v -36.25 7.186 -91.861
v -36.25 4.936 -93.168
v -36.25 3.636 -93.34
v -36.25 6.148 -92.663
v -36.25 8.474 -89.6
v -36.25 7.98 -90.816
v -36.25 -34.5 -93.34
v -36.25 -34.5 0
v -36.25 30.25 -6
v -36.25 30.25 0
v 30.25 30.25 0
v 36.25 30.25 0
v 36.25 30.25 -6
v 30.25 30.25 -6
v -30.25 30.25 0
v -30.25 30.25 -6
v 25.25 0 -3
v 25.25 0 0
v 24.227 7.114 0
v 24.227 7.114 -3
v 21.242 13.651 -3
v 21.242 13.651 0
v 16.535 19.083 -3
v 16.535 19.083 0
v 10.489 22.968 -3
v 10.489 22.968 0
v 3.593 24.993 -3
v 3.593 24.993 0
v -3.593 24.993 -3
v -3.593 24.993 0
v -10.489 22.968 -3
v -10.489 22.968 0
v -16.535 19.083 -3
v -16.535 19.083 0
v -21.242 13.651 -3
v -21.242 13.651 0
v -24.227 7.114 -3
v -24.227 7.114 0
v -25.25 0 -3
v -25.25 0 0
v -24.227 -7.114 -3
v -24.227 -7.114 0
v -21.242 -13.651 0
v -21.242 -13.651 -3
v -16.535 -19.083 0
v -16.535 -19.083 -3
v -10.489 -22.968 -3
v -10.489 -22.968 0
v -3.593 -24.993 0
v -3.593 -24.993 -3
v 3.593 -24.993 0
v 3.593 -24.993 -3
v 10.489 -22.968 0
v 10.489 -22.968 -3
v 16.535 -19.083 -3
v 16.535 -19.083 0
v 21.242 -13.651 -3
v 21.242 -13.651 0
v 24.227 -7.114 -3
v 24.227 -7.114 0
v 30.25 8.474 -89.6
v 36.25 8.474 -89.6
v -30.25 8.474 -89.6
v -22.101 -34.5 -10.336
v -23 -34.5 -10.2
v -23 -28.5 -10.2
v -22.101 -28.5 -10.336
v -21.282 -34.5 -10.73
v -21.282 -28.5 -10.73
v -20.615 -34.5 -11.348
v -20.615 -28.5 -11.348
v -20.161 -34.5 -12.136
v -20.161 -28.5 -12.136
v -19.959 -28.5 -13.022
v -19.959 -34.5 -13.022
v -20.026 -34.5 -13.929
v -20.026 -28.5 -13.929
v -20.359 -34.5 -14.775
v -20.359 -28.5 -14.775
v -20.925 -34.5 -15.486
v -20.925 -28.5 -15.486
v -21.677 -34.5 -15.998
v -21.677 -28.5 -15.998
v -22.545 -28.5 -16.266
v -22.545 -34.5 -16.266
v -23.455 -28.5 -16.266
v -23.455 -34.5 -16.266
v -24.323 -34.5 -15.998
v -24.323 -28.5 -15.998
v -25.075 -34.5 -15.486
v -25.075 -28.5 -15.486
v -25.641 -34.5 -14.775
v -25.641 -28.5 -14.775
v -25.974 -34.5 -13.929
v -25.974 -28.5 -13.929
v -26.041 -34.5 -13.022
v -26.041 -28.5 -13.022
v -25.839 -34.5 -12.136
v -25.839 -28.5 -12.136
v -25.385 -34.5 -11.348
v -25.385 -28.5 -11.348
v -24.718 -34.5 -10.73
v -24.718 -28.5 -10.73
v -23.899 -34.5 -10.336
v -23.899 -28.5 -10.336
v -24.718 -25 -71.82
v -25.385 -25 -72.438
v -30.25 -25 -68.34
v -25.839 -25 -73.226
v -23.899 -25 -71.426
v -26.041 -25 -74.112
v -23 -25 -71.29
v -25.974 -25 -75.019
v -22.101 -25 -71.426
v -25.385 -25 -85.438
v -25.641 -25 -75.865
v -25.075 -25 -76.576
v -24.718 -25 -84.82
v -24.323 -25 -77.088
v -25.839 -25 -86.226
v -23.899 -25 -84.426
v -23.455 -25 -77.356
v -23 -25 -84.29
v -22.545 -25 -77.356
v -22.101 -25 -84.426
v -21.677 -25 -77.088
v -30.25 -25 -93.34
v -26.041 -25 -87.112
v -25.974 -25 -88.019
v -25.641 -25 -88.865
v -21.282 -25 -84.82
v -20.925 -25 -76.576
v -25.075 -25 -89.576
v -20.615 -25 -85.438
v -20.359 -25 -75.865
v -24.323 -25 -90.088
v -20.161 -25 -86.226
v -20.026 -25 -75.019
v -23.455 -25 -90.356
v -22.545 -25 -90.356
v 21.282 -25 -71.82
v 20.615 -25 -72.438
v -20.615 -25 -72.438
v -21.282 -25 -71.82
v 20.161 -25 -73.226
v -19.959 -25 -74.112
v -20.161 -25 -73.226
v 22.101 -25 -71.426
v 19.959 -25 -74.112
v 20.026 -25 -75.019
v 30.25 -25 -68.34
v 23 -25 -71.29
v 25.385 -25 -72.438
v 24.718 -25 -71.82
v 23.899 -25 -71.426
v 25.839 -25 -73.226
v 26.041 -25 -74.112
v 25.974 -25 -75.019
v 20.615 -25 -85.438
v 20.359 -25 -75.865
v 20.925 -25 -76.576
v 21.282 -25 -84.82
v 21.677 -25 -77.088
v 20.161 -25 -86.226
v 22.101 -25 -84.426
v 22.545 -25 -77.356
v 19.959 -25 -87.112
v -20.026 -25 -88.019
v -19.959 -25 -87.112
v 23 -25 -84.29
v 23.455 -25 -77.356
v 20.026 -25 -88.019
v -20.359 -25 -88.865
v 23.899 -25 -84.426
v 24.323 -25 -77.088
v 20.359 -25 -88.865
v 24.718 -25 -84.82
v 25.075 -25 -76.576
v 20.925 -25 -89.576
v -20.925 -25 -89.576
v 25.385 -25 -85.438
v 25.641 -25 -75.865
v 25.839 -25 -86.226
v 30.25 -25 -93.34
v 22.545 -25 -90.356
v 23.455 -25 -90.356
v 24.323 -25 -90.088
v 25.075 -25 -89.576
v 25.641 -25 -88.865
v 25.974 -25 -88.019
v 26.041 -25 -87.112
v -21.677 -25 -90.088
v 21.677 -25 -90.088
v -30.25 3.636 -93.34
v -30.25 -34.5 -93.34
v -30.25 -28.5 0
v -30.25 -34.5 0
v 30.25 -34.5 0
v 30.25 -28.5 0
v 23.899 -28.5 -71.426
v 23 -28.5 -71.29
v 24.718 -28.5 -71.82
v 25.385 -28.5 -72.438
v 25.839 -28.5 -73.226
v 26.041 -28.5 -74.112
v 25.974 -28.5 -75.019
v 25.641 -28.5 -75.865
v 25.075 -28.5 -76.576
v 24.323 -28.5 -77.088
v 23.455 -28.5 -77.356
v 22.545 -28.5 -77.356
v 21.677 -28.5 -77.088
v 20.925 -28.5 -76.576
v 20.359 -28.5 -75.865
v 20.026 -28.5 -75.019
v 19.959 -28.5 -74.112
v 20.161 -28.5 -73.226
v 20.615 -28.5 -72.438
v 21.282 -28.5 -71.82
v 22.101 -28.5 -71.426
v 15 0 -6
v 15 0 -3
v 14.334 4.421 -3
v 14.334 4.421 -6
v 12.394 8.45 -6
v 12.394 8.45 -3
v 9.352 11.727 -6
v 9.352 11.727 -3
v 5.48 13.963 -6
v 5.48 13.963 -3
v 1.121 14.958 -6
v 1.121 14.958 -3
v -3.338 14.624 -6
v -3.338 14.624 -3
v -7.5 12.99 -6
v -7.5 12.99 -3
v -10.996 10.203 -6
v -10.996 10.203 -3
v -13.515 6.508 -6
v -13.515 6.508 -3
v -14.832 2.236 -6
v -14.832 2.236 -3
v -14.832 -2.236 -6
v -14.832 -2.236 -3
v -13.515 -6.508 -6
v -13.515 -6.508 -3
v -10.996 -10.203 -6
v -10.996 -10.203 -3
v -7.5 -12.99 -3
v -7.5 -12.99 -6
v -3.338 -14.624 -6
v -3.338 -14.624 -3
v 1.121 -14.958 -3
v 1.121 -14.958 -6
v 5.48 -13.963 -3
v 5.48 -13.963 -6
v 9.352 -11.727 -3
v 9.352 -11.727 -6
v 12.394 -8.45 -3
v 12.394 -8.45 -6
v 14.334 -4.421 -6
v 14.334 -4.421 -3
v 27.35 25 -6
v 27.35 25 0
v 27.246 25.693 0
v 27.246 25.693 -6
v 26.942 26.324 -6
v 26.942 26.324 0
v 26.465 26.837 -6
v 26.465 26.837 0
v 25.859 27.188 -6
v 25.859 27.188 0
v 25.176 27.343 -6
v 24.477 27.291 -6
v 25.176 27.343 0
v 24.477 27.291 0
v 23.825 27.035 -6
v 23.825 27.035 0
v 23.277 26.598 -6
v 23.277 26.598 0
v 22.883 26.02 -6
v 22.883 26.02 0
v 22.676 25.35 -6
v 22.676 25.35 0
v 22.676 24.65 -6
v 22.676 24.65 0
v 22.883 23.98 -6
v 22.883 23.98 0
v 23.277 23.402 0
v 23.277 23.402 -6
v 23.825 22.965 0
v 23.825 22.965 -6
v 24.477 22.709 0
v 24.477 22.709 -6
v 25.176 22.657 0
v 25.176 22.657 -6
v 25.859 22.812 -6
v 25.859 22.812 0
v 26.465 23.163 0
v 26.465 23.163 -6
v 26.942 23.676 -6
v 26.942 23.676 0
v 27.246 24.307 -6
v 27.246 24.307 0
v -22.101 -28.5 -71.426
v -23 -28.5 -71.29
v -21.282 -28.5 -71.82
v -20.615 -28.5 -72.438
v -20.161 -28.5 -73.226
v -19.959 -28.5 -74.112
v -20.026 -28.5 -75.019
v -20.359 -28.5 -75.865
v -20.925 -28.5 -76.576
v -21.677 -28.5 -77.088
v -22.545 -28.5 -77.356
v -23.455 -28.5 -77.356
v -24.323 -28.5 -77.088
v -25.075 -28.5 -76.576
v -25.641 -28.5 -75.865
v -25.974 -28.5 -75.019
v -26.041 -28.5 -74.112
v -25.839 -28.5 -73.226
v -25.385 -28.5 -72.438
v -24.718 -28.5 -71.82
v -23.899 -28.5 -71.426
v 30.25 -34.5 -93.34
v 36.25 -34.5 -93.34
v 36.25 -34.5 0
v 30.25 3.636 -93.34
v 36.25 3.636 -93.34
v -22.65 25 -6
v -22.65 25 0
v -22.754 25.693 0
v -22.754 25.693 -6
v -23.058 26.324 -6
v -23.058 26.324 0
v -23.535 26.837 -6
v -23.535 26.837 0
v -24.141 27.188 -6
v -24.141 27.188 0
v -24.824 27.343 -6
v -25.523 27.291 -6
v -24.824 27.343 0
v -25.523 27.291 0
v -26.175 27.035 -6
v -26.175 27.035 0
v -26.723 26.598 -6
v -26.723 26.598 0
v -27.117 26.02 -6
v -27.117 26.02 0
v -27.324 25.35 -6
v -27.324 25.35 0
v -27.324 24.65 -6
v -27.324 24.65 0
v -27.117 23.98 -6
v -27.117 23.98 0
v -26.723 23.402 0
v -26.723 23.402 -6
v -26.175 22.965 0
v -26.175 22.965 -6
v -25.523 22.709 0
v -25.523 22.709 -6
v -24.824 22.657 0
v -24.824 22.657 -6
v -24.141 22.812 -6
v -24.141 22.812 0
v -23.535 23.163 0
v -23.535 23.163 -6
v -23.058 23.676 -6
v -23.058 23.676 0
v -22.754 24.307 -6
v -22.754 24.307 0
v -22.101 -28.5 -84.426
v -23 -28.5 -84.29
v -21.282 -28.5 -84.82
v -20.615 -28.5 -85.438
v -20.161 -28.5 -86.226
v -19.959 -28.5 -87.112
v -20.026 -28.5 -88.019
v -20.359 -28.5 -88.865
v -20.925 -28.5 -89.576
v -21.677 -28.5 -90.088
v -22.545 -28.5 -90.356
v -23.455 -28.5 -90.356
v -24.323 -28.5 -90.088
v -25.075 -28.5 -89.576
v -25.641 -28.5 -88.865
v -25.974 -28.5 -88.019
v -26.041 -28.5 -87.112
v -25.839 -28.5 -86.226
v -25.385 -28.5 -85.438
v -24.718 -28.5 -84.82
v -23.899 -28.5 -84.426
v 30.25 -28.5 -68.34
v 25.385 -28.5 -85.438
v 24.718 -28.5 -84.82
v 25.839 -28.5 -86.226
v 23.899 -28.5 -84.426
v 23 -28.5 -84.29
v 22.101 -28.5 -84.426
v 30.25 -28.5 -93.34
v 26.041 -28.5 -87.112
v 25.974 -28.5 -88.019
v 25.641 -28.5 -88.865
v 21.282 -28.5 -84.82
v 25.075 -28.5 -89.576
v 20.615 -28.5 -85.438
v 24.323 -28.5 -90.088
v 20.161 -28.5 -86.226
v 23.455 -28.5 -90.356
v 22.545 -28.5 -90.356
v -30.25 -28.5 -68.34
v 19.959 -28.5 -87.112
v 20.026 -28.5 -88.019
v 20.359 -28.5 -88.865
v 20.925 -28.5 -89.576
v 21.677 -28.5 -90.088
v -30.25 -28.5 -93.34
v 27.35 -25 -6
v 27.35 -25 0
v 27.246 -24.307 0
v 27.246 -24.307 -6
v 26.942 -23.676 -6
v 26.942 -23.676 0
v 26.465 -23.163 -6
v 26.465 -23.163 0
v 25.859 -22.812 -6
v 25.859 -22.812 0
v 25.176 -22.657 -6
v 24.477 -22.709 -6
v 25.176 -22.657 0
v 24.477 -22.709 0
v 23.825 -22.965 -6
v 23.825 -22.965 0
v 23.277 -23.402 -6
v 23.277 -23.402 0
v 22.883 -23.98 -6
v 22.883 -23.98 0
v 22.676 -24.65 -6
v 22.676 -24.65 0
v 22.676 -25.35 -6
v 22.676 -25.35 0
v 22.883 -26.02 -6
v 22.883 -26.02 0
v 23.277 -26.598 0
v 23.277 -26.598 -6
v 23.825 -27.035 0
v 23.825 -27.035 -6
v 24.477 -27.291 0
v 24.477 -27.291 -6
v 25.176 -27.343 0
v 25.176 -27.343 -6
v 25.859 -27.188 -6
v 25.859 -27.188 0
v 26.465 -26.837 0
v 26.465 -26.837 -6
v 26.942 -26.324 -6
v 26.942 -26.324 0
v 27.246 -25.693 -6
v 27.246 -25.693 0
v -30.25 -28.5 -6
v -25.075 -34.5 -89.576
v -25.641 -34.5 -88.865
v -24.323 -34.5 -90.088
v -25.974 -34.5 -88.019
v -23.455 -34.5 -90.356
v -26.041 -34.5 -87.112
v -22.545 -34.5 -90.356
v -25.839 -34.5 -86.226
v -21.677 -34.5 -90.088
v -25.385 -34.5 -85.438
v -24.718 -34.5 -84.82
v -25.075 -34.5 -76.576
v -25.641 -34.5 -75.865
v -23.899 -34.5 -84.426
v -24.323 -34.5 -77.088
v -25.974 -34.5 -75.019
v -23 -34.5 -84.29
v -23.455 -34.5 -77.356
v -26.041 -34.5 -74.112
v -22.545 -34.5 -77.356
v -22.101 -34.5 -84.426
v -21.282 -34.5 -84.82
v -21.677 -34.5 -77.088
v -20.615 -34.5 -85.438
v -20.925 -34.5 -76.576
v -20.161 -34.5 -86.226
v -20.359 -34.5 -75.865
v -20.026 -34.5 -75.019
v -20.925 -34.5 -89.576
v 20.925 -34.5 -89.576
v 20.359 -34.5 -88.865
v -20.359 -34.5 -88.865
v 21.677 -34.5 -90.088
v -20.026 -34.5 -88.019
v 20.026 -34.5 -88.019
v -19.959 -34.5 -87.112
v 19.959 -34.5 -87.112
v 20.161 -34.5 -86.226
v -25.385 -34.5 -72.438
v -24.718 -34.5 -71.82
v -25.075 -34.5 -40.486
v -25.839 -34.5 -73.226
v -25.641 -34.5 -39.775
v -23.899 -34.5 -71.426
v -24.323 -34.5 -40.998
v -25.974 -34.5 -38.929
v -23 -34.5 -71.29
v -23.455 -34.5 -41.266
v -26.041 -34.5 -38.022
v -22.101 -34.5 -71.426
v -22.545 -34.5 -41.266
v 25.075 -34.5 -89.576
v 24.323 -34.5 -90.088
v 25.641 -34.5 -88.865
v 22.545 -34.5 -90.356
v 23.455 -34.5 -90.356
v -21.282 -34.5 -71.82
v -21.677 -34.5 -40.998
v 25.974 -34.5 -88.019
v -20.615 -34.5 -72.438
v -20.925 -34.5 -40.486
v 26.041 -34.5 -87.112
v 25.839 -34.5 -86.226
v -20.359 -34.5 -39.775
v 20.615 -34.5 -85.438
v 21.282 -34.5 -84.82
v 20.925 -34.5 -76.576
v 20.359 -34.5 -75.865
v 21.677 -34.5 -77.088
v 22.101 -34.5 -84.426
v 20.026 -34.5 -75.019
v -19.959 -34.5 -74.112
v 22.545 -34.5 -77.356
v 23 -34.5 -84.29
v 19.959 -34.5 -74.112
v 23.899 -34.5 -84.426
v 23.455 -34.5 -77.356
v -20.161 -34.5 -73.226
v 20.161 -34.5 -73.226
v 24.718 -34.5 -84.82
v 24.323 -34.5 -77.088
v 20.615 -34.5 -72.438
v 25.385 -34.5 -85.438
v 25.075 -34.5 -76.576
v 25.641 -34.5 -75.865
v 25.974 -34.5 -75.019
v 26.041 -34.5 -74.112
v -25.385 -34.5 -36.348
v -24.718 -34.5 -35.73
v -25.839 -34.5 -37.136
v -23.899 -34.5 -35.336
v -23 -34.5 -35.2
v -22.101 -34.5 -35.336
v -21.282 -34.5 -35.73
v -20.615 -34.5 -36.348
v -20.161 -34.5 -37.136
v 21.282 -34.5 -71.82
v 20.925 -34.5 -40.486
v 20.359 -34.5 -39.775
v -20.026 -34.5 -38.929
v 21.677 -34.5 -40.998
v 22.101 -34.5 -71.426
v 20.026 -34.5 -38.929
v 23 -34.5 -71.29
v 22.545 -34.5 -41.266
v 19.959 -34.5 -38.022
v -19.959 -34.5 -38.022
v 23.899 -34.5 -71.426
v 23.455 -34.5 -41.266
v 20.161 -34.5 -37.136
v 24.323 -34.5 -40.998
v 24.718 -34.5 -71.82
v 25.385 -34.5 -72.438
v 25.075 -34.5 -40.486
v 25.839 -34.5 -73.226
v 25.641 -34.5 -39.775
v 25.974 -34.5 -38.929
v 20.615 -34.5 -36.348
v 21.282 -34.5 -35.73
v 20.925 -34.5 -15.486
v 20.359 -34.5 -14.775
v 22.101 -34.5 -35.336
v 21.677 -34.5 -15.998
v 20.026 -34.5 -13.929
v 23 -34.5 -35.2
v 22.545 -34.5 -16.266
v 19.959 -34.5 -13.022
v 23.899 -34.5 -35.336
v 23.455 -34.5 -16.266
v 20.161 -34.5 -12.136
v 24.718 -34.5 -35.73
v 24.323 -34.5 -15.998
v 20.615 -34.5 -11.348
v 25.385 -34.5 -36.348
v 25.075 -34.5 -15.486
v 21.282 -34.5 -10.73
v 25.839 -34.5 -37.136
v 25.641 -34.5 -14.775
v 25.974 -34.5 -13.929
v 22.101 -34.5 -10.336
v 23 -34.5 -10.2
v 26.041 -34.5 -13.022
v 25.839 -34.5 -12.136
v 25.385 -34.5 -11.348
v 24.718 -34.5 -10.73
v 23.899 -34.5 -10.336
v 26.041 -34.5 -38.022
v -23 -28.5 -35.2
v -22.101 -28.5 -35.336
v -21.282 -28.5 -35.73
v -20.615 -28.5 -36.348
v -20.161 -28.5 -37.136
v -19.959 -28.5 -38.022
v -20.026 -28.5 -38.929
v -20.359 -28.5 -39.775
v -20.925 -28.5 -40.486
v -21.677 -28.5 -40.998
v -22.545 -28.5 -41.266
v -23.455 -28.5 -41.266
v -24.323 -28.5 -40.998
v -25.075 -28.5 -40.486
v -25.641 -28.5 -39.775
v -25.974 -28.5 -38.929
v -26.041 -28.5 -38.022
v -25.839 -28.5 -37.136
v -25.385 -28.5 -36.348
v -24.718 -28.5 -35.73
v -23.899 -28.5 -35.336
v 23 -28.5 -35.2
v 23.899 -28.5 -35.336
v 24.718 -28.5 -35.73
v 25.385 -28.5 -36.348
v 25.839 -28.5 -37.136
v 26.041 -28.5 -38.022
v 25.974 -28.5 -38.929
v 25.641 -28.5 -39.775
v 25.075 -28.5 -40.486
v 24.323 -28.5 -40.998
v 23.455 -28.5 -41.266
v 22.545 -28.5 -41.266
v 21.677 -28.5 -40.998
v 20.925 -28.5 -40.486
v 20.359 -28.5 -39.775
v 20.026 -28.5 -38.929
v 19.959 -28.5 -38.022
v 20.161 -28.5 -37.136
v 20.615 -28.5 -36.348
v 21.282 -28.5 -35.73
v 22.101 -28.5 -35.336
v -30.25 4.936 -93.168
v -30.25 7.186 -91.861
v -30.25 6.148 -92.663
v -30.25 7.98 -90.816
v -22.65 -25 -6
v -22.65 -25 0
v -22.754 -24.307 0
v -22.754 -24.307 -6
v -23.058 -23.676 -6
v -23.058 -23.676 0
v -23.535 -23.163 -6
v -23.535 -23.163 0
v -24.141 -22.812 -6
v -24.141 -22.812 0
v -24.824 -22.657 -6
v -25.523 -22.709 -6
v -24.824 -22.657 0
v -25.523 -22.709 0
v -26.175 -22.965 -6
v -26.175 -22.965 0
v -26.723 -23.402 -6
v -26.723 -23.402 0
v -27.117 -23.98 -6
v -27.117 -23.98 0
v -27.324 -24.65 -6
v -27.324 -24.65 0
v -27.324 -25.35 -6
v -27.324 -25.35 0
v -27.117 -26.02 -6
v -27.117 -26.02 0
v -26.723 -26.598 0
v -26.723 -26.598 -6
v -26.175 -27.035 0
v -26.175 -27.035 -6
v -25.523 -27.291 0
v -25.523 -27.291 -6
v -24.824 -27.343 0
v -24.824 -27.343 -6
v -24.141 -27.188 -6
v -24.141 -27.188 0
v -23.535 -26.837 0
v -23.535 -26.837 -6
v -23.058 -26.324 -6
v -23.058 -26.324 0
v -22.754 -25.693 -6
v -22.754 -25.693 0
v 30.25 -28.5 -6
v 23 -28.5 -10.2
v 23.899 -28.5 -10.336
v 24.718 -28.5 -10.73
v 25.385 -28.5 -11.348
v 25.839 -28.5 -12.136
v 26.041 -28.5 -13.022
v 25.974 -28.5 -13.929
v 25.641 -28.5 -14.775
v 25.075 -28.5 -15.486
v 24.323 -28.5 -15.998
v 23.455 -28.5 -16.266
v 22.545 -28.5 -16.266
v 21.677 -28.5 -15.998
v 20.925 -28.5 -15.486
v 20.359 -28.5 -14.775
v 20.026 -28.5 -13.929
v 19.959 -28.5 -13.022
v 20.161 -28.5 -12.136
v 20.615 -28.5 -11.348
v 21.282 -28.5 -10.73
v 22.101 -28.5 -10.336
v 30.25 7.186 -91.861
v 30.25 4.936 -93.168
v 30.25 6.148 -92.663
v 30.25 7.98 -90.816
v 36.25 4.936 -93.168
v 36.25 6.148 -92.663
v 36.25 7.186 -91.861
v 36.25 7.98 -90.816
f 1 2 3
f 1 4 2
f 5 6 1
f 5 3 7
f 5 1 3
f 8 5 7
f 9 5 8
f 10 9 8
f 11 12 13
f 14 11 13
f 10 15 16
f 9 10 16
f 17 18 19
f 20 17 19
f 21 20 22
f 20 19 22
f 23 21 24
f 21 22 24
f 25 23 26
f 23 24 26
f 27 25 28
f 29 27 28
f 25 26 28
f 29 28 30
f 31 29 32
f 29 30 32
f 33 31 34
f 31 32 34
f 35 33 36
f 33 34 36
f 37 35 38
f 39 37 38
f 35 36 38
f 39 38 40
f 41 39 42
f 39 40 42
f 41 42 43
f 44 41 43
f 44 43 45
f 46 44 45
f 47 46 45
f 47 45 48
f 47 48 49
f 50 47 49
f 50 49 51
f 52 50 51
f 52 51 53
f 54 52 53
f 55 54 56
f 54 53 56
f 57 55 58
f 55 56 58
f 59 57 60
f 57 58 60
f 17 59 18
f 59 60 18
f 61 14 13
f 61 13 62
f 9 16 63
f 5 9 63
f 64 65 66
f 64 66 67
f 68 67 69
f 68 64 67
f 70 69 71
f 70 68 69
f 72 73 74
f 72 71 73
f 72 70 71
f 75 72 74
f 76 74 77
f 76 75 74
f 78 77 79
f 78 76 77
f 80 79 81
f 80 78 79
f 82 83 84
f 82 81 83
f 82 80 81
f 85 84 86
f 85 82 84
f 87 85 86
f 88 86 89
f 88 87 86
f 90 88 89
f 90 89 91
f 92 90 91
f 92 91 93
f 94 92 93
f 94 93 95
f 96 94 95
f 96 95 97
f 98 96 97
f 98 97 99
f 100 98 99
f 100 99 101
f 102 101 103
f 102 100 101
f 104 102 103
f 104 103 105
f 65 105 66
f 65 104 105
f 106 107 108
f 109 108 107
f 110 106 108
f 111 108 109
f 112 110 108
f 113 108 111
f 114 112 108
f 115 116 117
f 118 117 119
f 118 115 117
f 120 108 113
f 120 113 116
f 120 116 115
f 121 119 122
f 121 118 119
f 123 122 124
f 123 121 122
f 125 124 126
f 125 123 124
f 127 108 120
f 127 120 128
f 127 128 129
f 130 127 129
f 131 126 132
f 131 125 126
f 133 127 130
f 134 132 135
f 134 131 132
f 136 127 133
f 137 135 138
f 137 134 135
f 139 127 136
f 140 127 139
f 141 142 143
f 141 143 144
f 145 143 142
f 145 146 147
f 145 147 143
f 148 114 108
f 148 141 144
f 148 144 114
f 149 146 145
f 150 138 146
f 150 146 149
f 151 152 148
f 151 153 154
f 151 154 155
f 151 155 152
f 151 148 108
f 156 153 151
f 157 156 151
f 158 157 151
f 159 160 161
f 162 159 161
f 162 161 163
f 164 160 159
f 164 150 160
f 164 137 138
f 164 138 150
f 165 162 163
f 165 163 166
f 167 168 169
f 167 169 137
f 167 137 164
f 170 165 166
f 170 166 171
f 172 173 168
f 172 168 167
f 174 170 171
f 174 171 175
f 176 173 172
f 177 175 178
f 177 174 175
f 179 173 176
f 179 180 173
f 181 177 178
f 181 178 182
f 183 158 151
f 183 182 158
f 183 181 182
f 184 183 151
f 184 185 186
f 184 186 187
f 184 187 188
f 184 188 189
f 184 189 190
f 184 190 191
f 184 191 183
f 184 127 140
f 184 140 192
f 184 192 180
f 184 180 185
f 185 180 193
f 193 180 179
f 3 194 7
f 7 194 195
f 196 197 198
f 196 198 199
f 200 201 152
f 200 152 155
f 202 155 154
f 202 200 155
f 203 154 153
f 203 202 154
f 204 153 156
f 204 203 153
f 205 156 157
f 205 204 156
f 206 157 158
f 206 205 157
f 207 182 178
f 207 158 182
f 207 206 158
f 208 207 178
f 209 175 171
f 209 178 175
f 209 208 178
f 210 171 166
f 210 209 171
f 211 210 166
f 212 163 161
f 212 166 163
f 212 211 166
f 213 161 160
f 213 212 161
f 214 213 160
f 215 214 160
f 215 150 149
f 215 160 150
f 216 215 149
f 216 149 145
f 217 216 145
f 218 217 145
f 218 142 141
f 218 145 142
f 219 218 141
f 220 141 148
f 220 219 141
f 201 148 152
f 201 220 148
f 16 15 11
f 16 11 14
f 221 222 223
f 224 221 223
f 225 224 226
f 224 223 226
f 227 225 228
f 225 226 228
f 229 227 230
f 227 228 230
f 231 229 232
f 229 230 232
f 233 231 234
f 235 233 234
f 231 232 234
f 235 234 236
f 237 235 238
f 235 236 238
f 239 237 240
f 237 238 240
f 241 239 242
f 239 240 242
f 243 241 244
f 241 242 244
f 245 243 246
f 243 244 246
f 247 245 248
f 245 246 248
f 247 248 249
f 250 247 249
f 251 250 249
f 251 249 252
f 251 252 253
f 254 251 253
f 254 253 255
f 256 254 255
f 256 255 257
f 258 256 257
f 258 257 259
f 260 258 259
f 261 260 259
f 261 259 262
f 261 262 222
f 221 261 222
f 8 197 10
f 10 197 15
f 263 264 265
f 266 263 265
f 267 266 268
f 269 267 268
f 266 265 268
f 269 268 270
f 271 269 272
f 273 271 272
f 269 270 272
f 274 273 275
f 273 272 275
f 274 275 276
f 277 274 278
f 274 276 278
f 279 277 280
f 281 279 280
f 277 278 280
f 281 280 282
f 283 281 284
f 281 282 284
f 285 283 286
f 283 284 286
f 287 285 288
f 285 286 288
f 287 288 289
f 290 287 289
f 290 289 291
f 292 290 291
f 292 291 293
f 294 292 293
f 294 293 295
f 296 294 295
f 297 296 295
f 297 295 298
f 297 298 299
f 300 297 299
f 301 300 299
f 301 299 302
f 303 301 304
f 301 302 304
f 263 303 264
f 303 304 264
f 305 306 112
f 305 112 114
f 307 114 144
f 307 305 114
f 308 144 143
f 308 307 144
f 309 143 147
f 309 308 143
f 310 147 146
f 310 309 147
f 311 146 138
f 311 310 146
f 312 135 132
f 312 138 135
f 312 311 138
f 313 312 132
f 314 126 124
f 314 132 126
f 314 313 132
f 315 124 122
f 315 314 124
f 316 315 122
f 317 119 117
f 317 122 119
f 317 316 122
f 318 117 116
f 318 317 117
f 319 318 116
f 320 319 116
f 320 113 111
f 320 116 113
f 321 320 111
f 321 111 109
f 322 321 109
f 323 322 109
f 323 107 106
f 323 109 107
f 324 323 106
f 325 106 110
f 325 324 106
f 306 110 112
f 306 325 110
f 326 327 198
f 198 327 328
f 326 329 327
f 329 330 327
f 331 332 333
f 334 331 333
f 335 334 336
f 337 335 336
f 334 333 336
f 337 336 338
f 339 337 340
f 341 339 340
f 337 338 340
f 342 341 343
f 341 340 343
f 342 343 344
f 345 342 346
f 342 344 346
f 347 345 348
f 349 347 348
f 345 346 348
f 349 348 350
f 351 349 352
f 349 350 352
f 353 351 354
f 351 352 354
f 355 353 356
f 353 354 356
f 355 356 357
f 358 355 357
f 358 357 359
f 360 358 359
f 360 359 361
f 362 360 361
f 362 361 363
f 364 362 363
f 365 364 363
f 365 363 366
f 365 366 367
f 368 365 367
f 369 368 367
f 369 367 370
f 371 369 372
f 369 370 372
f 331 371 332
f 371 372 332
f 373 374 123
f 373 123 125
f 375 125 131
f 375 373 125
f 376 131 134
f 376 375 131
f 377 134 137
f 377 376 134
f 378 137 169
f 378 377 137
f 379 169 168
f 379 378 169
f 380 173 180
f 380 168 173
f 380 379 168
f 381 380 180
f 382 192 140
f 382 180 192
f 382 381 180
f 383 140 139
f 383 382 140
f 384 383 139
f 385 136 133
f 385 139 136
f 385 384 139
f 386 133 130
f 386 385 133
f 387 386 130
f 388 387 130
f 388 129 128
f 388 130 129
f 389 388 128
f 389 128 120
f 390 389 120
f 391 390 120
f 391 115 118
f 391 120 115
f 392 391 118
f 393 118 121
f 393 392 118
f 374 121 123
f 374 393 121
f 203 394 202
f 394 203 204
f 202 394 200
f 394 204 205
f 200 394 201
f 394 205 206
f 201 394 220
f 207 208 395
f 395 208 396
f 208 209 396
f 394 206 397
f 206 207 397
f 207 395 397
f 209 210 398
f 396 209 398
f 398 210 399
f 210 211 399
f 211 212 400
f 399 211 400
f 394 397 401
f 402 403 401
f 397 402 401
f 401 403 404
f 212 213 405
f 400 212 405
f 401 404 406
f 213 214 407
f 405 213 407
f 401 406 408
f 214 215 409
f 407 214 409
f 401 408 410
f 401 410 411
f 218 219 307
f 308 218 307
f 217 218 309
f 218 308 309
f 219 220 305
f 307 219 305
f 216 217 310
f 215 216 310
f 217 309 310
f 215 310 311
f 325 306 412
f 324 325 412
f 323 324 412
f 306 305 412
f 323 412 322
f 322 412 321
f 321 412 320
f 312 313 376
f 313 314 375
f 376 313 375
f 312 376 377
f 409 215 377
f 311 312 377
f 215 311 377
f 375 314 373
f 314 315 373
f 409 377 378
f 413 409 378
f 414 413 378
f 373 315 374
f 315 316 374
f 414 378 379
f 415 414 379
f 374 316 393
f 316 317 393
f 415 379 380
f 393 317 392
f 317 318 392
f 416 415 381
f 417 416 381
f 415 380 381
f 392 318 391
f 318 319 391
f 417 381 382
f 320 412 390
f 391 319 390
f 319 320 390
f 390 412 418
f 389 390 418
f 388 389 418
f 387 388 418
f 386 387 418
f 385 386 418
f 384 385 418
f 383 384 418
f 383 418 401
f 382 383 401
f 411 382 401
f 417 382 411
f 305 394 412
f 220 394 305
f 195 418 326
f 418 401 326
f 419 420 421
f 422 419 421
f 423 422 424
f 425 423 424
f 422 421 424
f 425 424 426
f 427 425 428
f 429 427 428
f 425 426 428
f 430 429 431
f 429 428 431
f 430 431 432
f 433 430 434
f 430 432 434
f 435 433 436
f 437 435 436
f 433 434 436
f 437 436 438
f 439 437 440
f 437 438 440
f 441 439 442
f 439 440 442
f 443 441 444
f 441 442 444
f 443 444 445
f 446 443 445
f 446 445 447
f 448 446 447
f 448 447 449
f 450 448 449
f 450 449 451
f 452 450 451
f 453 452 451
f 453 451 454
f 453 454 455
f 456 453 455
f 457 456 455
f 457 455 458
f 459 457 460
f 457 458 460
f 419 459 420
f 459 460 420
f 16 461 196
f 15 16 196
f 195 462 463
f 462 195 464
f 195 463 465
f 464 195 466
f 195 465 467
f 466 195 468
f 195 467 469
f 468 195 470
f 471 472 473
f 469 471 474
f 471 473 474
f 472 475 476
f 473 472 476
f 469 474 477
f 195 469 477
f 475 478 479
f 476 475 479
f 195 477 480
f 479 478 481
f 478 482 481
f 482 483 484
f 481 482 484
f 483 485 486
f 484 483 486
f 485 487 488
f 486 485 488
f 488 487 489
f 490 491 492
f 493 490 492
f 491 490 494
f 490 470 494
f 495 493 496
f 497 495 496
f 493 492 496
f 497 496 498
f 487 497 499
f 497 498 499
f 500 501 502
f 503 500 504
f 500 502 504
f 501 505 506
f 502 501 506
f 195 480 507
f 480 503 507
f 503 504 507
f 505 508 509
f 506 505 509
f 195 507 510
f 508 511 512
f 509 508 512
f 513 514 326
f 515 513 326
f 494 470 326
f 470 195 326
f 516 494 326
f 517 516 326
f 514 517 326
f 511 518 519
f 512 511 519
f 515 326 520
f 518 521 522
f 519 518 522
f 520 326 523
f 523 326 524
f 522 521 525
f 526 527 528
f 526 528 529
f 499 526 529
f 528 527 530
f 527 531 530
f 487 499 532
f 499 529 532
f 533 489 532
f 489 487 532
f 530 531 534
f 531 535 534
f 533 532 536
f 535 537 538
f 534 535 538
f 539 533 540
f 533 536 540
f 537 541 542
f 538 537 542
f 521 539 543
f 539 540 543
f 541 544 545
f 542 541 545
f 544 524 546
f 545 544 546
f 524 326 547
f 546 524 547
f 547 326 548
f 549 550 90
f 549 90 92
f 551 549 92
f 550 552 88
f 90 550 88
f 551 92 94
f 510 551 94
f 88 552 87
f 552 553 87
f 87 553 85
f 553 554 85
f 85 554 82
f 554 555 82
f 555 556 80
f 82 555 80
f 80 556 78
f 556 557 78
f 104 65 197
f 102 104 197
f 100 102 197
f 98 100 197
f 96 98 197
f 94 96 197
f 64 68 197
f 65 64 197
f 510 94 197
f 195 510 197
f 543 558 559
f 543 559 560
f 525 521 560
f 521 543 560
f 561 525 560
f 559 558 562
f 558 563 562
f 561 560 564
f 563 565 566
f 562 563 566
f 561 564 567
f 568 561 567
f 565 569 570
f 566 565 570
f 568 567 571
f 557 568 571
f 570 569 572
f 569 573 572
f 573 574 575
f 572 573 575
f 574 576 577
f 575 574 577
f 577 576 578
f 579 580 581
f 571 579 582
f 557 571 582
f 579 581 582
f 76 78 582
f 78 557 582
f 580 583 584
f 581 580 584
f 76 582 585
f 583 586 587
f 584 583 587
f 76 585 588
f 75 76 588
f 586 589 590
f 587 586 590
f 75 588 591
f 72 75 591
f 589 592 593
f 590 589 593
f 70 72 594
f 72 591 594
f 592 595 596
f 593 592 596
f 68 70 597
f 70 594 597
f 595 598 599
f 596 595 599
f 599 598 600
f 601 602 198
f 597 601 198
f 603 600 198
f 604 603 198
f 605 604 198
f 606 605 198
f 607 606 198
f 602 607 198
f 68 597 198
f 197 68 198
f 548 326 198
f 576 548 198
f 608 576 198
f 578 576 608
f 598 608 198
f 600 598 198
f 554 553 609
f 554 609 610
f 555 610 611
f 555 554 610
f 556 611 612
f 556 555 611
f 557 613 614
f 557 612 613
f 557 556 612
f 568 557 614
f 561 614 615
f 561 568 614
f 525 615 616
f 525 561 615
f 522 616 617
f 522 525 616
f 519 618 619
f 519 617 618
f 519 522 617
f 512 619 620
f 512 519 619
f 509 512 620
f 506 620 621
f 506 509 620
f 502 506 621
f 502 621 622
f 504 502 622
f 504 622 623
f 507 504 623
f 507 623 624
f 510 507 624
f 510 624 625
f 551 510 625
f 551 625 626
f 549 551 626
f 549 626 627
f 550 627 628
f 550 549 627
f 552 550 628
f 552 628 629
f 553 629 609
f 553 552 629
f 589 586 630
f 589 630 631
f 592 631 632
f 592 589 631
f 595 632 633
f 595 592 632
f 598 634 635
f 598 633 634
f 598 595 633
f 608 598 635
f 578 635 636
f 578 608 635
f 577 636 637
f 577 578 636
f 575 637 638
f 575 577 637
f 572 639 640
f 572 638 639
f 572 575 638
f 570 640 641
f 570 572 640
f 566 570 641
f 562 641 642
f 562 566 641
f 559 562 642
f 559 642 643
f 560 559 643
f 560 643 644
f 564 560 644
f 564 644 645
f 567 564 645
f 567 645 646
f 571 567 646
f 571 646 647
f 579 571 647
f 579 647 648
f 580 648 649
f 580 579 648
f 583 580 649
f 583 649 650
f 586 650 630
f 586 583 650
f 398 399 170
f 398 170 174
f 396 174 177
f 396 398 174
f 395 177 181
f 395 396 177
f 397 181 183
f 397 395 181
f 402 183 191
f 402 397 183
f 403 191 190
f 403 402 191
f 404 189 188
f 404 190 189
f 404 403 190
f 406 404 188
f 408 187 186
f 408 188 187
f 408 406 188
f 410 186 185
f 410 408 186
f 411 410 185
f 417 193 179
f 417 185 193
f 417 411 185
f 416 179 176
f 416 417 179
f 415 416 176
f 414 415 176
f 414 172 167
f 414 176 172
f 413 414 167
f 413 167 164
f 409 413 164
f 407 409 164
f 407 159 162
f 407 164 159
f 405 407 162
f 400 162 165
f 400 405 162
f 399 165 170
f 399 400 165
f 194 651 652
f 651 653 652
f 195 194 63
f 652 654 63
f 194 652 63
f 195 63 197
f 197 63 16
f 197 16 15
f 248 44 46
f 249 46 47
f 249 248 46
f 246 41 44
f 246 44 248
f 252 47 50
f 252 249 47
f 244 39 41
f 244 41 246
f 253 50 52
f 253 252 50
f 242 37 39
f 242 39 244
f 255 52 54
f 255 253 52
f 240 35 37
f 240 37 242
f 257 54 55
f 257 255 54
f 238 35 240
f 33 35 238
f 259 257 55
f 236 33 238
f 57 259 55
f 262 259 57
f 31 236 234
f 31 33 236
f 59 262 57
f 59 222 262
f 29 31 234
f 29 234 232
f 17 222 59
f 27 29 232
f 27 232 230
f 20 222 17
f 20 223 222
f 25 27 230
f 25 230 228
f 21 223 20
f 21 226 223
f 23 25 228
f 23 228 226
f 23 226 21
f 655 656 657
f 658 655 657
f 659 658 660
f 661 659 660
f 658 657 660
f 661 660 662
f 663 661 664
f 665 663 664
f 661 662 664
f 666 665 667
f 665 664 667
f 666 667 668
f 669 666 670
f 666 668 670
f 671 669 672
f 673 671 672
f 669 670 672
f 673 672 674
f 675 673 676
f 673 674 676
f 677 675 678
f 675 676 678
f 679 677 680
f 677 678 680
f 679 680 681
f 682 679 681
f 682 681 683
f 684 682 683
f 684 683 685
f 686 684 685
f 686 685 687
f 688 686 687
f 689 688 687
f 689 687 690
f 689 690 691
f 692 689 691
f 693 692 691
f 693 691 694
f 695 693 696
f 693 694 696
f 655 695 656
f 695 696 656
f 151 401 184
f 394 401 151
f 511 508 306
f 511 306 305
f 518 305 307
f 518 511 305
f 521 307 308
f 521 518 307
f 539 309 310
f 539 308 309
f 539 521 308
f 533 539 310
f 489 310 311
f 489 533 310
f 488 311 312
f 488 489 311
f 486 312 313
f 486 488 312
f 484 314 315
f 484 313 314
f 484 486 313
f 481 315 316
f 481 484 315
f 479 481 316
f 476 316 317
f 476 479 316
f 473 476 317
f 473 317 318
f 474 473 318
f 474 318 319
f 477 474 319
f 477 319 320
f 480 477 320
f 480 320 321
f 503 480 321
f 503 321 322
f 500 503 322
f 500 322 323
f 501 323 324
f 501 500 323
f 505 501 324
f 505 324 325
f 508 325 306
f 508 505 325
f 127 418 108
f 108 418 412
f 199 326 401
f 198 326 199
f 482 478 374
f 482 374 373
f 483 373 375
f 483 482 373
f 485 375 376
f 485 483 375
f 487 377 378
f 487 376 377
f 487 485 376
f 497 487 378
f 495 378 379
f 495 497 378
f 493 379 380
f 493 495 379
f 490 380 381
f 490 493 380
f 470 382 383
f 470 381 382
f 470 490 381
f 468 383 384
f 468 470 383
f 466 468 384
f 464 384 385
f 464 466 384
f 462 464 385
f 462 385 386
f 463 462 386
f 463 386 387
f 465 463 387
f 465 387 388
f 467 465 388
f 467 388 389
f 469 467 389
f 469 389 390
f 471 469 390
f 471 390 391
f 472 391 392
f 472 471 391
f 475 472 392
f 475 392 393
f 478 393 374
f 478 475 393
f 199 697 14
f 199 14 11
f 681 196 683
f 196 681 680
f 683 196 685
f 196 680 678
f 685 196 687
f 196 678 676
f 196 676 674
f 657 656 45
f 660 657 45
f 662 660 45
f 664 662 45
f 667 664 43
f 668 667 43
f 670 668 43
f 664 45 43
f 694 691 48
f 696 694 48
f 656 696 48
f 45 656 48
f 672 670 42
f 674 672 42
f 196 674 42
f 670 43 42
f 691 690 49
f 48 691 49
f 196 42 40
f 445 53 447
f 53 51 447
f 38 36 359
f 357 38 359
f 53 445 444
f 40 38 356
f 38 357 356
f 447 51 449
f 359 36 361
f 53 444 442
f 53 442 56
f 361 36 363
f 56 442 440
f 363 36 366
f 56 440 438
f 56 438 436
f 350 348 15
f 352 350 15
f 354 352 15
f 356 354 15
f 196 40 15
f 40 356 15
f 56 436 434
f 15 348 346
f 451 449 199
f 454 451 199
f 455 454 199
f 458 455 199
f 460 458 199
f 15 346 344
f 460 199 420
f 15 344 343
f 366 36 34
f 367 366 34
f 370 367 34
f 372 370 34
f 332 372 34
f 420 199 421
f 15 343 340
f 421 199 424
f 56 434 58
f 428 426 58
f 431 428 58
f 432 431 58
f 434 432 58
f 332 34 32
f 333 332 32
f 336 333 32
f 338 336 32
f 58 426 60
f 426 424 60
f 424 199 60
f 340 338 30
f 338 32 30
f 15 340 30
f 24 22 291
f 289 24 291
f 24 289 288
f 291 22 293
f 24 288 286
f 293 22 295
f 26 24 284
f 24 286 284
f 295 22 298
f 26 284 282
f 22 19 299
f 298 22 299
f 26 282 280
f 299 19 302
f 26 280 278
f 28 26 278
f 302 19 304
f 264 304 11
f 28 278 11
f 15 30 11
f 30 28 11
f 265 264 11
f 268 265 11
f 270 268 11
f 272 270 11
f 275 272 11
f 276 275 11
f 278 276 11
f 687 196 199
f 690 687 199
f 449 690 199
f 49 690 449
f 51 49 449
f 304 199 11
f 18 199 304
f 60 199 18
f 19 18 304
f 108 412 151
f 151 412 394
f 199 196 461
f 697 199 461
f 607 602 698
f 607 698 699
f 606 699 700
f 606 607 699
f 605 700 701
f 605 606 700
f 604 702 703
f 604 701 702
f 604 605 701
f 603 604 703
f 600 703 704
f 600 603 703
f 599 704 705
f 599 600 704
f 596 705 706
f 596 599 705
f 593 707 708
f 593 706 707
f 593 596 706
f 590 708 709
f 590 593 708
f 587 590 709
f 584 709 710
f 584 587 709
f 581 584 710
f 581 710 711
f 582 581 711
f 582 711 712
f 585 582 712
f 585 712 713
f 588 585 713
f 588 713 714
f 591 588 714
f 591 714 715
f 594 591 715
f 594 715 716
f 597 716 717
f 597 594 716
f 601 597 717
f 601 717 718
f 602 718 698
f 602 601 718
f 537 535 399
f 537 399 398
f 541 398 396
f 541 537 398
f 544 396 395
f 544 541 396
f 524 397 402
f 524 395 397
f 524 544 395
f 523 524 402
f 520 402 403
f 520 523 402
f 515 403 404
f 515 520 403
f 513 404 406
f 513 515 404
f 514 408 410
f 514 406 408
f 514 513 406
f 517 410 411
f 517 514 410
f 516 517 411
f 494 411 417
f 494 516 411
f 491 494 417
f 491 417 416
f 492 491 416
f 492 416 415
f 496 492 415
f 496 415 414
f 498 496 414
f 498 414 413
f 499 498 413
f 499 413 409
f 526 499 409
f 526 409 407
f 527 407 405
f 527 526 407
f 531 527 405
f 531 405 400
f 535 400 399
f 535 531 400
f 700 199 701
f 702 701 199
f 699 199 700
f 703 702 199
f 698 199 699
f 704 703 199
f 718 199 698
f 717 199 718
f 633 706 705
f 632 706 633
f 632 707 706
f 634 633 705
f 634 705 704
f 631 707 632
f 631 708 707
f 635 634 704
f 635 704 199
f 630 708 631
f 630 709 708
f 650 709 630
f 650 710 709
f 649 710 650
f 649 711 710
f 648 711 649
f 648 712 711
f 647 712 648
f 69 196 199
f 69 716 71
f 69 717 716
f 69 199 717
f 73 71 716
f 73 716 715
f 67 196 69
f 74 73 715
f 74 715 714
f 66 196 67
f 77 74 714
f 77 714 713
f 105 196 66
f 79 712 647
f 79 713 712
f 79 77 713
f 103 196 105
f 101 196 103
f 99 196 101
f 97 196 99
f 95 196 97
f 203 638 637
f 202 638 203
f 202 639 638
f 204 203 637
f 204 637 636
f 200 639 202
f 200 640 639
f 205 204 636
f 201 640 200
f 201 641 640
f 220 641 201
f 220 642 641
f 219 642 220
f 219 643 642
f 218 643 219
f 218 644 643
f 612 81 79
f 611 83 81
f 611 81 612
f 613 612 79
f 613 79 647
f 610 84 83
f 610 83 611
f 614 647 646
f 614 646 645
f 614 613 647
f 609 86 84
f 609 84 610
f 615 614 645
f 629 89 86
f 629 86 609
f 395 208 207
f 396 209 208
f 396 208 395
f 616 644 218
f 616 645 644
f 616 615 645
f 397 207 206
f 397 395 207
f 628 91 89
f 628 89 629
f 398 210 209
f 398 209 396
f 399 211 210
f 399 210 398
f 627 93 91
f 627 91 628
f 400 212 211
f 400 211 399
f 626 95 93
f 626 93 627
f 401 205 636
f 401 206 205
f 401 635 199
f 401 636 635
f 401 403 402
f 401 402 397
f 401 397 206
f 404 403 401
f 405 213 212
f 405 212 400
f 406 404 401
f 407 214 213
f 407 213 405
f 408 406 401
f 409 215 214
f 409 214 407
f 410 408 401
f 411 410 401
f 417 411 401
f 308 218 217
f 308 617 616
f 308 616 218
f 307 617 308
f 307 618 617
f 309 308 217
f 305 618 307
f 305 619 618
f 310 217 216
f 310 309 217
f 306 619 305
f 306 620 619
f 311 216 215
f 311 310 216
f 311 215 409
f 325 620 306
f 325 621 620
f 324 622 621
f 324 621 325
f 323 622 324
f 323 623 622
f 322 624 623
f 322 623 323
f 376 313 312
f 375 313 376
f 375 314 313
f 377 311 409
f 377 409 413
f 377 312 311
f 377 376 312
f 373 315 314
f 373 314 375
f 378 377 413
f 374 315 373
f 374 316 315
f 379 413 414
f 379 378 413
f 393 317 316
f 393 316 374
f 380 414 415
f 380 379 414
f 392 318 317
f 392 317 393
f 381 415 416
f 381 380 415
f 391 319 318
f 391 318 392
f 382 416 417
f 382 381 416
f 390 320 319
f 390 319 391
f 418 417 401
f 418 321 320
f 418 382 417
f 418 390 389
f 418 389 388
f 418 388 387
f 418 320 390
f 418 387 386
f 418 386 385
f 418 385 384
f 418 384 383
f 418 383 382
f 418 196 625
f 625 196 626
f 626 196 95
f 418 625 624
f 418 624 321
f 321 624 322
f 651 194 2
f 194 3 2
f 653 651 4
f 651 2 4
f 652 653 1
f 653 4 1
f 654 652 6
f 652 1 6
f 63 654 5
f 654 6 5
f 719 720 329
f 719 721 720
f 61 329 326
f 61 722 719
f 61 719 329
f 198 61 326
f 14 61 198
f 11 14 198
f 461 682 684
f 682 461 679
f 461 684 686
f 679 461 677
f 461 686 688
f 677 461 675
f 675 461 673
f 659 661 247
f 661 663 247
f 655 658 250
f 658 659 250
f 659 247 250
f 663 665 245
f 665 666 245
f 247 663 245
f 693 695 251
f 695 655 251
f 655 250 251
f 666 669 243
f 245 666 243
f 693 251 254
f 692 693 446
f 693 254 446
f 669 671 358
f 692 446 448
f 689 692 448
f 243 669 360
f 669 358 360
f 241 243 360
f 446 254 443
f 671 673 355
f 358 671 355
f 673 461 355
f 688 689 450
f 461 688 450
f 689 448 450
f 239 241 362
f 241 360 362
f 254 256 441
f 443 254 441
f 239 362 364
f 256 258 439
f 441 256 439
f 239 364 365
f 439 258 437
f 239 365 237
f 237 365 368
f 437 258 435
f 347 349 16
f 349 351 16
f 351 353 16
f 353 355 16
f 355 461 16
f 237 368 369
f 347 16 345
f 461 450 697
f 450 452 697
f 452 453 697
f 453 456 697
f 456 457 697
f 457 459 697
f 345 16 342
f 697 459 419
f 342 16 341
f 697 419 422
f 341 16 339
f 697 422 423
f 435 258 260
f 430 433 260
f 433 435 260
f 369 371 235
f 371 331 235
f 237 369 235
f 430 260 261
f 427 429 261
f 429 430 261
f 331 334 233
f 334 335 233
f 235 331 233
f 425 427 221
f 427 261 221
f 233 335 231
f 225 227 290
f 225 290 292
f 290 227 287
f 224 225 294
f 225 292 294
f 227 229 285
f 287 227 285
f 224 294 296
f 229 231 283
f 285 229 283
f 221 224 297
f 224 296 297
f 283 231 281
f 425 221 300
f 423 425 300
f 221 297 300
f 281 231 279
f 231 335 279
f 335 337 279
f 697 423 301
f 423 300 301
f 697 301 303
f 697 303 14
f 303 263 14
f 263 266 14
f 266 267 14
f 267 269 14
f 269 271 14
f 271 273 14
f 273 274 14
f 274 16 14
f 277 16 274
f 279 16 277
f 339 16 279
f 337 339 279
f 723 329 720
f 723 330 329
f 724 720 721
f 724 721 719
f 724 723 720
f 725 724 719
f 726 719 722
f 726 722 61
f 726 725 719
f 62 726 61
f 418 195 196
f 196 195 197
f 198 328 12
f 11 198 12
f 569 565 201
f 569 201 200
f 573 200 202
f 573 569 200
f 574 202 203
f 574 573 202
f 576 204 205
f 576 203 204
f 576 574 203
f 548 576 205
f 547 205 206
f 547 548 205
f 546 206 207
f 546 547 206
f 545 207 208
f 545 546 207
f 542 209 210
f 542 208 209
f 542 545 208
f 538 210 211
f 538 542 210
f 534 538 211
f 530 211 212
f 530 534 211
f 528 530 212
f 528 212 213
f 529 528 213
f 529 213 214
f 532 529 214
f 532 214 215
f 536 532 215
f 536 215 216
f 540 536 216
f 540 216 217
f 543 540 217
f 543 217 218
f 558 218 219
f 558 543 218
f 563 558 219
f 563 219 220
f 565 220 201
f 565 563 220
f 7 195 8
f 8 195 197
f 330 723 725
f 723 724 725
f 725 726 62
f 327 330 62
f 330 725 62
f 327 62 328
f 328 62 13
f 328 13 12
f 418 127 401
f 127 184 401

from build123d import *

# Parameters (mm, degrees)
SKETCH1_W                = 60.5
SKETCH1_H                = 60.5
SKETCH1_R                = 15
SKETCH1_R_2              = 2.35
BOSS_EXTRUDE1_DEPTH      = 6
SKETCH2_R                = 25.25
CUT_EXTRUDE1_DEPTH       = 3
SKETCH3_W                = 60.5
SKETCH3_H                = 6
BOSS_EXTRUDE2_DEPTH      = 4.25
SKETCH4_W                = 60.5
SKETCH4_H                = 6
BOSS_EXTRUDE3_DEPTH      = 87.34
BOSS_EXTRUDE4_DEPTH      = 6
SKETCH6_W                = 60.5
SKETCH6_H                = 25
BOSS_EXTRUDE5_DEPTH      = 3.5
CUT_EXTRUDE2_DEPTH       = 115.363370884
CUT_EXTRUDE2_DEPTH_BACK  = 115.363370884
SKETCH7_R                = 3.05
FILLET1_R                = 5
SPLIT1_SURFACE_1_1_BACK  = 135.763
SPLIT1_SURFACE_1_1_DEPTH = 271.526
SPLIT1_SURFACE_1_2_BACK  = 135.763
SPLIT1_SURFACE_1_2_DEPTH = 271.526
SPLIT1_SURFACE_2_3_BACK  = 135.763
SPLIT1_SURFACE_2_3_DEPTH = 271.526
SPLIT1_SURFACE_2_4_BACK  = 135.763
SPLIT1_SURFACE_2_4_DEPTH = 271.526
SPLIT2_SURFACE_5_BACK    = 135.763
SPLIT2_SURFACE_5_DEPTH   = 271.526
SPLIT2_SURFACE_6_BACK    = 135.763
SPLIT2_SURFACE_6_DEPTH   = 271.526


with BuildPart() as part:
    # Sketch1 → Boss-Extrude1 (new body)
    with BuildSketch(Plane.XY):
        Rectangle(SKETCH1_W, SKETCH1_H)
        Circle(SKETCH1_R, mode=Mode.SUBTRACT)
        with Locations((-25, 25)):
            Circle(SKETCH1_R_2, mode=Mode.SUBTRACT)
        with Locations((25, 25)):
            Circle(SKETCH1_R_2, mode=Mode.SUBTRACT)
        with Locations((25, -25)):
            Circle(SKETCH1_R_2, mode=Mode.SUBTRACT)
        with Locations((-25, -25)):
            Circle(SKETCH1_R_2, mode=Mode.SUBTRACT)
    extrude(amount=-BOSS_EXTRUDE1_DEPTH)

    # Sketch2 → Cut-Extrude1 (cut)
    with BuildSketch(Plane.XY):
        Circle(SKETCH2_R)
    extrude(amount=-CUT_EXTRUDE1_DEPTH, mode=Mode.SUBTRACT)

    # Sketch3 → Boss-Extrude2 (add)
    with BuildSketch(Plane.XZ.offset(30.25)):
        with Locations((0, -3)):
            Rectangle(SKETCH3_W, SKETCH3_H)
    extrude(amount=BOSS_EXTRUDE2_DEPTH)

    # Sketch4 → Boss-Extrude3 (add)
    with BuildSketch(Plane(origin=(0, 0, -6), x_dir=(-1, 0, 0), z_dir=(0, 0, -1))):
        with Locations((0, -31.5)):
            Rectangle(SKETCH4_W, SKETCH4_H)
    extrude(amount=BOSS_EXTRUDE3_DEPTH)

    # Sketch5 → Boss-Extrude4 (add)
    with BuildSketch(Plane(origin=(30.25, 0, 0), x_dir=(0, 0, -1), z_dir=(1, 0, 0))):
        Polygon((0, 30.25), (6, 30.25), (93.34, 7.5), (93.34, -34.5), (0, -34.5), align=None)
    boss_extrude4 = extrude(amount=BOSS_EXTRUDE4_DEPTH)

    # Mirror1: Boss-Extrude4 across plane
    add(boss_extrude4.mirror(Plane(origin=(0, 0, 0), x_dir=(0, 0, 1), z_dir=(1, 0, 0))))

    # Sketch6 → Boss-Extrude5 (add)
    with BuildSketch(Plane(origin=(0, -28.5, 0), x_dir=(1, 0, 0), z_dir=(0, 1, 0))):
        with Locations((0, 80.84)):
            Rectangle(SKETCH6_W, SKETCH6_H)
    extrude(amount=BOSS_EXTRUDE5_DEPTH)

    # Sketch7 → Cut-Extrude2 (cut, two sides: drawn at the far end of the back side and taken through both)
    with BuildSketch(Plane(origin=(0, -25, 0), x_dir=(1, 0, 0), z_dir=(0, 1, 0)).offset(-CUT_EXTRUDE2_DEPTH_BACK)):
        with Locations(Location((-23, 87.34, 0), (0, 0, 270))):
            Circle(SKETCH7_R)
        with Locations(Location((23, 87.34, 0), (0, 0, 270))):
            Circle(SKETCH7_R)
        with Locations(Location((23, 74.34, 0), (0, 0, 270))):
            Circle(SKETCH7_R)
        with Locations(Location((-23, 74.34, 0), (0, 0, 270))):
            Circle(SKETCH7_R)
        with Locations(Location((-23, 13.25, 0), (0, 0, 270))):
            Circle(SKETCH7_R)
        with Locations(Location((23, 13.25, 0), (0, 0, 270))):
            Circle(SKETCH7_R)
        with Locations(Location((-23, 38.25, 0), (0, 0, 270))):
            Circle(SKETCH7_R)
        with Locations(Location((23, 38.25, 0), (0, 0, 270))):
            Circle(SKETCH7_R)
    extrude(amount=CUT_EXTRUDE2_DEPTH + CUT_EXTRUDE2_DEPTH_BACK, mode=Mode.SUBTRACT)

    # Fillet1
    fillet1_edges = [part.edges().sort_by_distance(p)[0] for p in [
        (33.25, 7.5, -93.34),
        (-33.25, 7.5, -93.34),
    ]]
    fillet(fillet1_edges, radius=FILLET1_R)


with BuildPart() as body_2:
    # Split1: the piece behind the surface
    add(part.part)
    # Split1 surface 1: a surface, the sketch's curves swept straight by 271.526 mm
    with BuildLine(Plane(origin=(0, 30.25, 0), x_dir=(1, 0, 0), z_dir=(0, 1, 0)).offset(-SPLIT1_SURFACE_1_1_BACK), mode=Mode.PRIVATE) as split1_surface_1_1_path:
        Line((-30.25, 93.34), (-30.25, 0))
    split1_surface_1_1 = Shell.extrude(split1_surface_1_1_path.wire(), (0 * SPLIT1_SURFACE_1_1_DEPTH, 1 * SPLIT1_SURFACE_1_1_DEPTH, 0 * SPLIT1_SURFACE_1_1_DEPTH))
    split(bisect_by=split1_surface_1_1, keep=Keep.BOTTOM)


with BuildPart() as part_1:
    add(part.part)

    # Split1: split by a surface, the side it looks to stays
    # Split1 surface 1: a surface, the sketch's curves swept straight by 271.526 mm
    with BuildLine(Plane(origin=(0, 30.25, 0), x_dir=(1, 0, 0), z_dir=(0, 1, 0)).offset(-SPLIT1_SURFACE_1_2_BACK), mode=Mode.PRIVATE) as split1_surface_1_2_path:
        Line((-30.25, 93.34), (-30.25, 0))
    split1_surface_1_2 = Shell.extrude(split1_surface_1_2_path.wire(), (0 * SPLIT1_SURFACE_1_2_DEPTH, 1 * SPLIT1_SURFACE_1_2_DEPTH, 0 * SPLIT1_SURFACE_1_2_DEPTH))
    split(bisect_by=split1_surface_1_2, keep=Keep.TOP)


with BuildPart() as body_3:
    # Split1 2: the piece behind the surface
    add(part_1.part)
    # Split1 surface 2: a surface, the sketch's curves swept straight by 271.526 mm
    with BuildLine(Plane(origin=(0, 30.25, 0), x_dir=(1, 0, 0), z_dir=(0, 1, 0)).offset(-SPLIT1_SURFACE_2_3_BACK), mode=Mode.PRIVATE) as split1_surface_2_3_path:
        Line((30.25, 93.34), (30.25, 0))
    split1_surface_2_3 = Shell.extrude(split1_surface_2_3_path.wire(), (0 * SPLIT1_SURFACE_2_3_DEPTH, 1 * SPLIT1_SURFACE_2_3_DEPTH, 0 * SPLIT1_SURFACE_2_3_DEPTH))
    split(bisect_by=split1_surface_2_3, keep=Keep.BOTTOM)


with BuildPart() as part_2:
    add(part_1.part)

    # Split1 2: split by a surface, the side it looks to stays
    # Split1 surface 2: a surface, the sketch's curves swept straight by 271.526 mm
    with BuildLine(Plane(origin=(0, 30.25, 0), x_dir=(1, 0, 0), z_dir=(0, 1, 0)).offset(-SPLIT1_SURFACE_2_4_BACK), mode=Mode.PRIVATE) as split1_surface_2_4_path:
        Line((30.25, 93.34), (30.25, 0))
    split1_surface_2_4 = Shell.extrude(split1_surface_2_4_path.wire(), (0 * SPLIT1_SURFACE_2_4_DEPTH, 1 * SPLIT1_SURFACE_2_4_DEPTH, 0 * SPLIT1_SURFACE_2_4_DEPTH))
    split(bisect_by=split1_surface_2_4, keep=Keep.TOP)


with BuildPart() as body_4_2:
    # Split2: the piece behind the surface
    add(body_3.part)
    # Split2 surface: a surface, the sketch's curves swept straight by 271.526 mm
    with BuildLine(Plane(origin=(30.25, 0, 0), x_dir=(0, 0, -1), z_dir=(1, 0, 0)).offset(-SPLIT2_SURFACE_5_BACK), mode=Mode.PRIVATE) as split2_surface_5_path:
        Line((0, -28.5), (93.34, -28.5))
    split2_surface_5 = Shell.extrude(split2_surface_5_path.wire(), (1 * SPLIT2_SURFACE_5_DEPTH, 0 * SPLIT2_SURFACE_5_DEPTH, 0 * SPLIT2_SURFACE_5_DEPTH))
    split(bisect_by=split2_surface_5, keep=Keep.BOTTOM)


with BuildPart() as body_3_1:
    add(body_3.part)

    # Split2: split by a surface, the side it looks to stays
    # Split2 surface: a surface, the sketch's curves swept straight by 271.526 mm
    with BuildLine(Plane(origin=(30.25, 0, 0), x_dir=(0, 0, -1), z_dir=(1, 0, 0)).offset(-SPLIT2_SURFACE_6_BACK), mode=Mode.PRIVATE) as split2_surface_6_path:
        Line((0, -28.5), (93.34, -28.5))
    split2_surface_6 = Shell.extrude(split2_surface_6_path.wire(), (1 * SPLIT2_SURFACE_6_DEPTH, 0 * SPLIT2_SURFACE_6_DEPTH, 0 * SPLIT2_SURFACE_6_DEPTH))
    split(bisect_by=split2_surface_6, keep=Keep.TOP)


solid = Compound([body_2.part, part_2.part, body_4_2.part, body_3_1.part])
